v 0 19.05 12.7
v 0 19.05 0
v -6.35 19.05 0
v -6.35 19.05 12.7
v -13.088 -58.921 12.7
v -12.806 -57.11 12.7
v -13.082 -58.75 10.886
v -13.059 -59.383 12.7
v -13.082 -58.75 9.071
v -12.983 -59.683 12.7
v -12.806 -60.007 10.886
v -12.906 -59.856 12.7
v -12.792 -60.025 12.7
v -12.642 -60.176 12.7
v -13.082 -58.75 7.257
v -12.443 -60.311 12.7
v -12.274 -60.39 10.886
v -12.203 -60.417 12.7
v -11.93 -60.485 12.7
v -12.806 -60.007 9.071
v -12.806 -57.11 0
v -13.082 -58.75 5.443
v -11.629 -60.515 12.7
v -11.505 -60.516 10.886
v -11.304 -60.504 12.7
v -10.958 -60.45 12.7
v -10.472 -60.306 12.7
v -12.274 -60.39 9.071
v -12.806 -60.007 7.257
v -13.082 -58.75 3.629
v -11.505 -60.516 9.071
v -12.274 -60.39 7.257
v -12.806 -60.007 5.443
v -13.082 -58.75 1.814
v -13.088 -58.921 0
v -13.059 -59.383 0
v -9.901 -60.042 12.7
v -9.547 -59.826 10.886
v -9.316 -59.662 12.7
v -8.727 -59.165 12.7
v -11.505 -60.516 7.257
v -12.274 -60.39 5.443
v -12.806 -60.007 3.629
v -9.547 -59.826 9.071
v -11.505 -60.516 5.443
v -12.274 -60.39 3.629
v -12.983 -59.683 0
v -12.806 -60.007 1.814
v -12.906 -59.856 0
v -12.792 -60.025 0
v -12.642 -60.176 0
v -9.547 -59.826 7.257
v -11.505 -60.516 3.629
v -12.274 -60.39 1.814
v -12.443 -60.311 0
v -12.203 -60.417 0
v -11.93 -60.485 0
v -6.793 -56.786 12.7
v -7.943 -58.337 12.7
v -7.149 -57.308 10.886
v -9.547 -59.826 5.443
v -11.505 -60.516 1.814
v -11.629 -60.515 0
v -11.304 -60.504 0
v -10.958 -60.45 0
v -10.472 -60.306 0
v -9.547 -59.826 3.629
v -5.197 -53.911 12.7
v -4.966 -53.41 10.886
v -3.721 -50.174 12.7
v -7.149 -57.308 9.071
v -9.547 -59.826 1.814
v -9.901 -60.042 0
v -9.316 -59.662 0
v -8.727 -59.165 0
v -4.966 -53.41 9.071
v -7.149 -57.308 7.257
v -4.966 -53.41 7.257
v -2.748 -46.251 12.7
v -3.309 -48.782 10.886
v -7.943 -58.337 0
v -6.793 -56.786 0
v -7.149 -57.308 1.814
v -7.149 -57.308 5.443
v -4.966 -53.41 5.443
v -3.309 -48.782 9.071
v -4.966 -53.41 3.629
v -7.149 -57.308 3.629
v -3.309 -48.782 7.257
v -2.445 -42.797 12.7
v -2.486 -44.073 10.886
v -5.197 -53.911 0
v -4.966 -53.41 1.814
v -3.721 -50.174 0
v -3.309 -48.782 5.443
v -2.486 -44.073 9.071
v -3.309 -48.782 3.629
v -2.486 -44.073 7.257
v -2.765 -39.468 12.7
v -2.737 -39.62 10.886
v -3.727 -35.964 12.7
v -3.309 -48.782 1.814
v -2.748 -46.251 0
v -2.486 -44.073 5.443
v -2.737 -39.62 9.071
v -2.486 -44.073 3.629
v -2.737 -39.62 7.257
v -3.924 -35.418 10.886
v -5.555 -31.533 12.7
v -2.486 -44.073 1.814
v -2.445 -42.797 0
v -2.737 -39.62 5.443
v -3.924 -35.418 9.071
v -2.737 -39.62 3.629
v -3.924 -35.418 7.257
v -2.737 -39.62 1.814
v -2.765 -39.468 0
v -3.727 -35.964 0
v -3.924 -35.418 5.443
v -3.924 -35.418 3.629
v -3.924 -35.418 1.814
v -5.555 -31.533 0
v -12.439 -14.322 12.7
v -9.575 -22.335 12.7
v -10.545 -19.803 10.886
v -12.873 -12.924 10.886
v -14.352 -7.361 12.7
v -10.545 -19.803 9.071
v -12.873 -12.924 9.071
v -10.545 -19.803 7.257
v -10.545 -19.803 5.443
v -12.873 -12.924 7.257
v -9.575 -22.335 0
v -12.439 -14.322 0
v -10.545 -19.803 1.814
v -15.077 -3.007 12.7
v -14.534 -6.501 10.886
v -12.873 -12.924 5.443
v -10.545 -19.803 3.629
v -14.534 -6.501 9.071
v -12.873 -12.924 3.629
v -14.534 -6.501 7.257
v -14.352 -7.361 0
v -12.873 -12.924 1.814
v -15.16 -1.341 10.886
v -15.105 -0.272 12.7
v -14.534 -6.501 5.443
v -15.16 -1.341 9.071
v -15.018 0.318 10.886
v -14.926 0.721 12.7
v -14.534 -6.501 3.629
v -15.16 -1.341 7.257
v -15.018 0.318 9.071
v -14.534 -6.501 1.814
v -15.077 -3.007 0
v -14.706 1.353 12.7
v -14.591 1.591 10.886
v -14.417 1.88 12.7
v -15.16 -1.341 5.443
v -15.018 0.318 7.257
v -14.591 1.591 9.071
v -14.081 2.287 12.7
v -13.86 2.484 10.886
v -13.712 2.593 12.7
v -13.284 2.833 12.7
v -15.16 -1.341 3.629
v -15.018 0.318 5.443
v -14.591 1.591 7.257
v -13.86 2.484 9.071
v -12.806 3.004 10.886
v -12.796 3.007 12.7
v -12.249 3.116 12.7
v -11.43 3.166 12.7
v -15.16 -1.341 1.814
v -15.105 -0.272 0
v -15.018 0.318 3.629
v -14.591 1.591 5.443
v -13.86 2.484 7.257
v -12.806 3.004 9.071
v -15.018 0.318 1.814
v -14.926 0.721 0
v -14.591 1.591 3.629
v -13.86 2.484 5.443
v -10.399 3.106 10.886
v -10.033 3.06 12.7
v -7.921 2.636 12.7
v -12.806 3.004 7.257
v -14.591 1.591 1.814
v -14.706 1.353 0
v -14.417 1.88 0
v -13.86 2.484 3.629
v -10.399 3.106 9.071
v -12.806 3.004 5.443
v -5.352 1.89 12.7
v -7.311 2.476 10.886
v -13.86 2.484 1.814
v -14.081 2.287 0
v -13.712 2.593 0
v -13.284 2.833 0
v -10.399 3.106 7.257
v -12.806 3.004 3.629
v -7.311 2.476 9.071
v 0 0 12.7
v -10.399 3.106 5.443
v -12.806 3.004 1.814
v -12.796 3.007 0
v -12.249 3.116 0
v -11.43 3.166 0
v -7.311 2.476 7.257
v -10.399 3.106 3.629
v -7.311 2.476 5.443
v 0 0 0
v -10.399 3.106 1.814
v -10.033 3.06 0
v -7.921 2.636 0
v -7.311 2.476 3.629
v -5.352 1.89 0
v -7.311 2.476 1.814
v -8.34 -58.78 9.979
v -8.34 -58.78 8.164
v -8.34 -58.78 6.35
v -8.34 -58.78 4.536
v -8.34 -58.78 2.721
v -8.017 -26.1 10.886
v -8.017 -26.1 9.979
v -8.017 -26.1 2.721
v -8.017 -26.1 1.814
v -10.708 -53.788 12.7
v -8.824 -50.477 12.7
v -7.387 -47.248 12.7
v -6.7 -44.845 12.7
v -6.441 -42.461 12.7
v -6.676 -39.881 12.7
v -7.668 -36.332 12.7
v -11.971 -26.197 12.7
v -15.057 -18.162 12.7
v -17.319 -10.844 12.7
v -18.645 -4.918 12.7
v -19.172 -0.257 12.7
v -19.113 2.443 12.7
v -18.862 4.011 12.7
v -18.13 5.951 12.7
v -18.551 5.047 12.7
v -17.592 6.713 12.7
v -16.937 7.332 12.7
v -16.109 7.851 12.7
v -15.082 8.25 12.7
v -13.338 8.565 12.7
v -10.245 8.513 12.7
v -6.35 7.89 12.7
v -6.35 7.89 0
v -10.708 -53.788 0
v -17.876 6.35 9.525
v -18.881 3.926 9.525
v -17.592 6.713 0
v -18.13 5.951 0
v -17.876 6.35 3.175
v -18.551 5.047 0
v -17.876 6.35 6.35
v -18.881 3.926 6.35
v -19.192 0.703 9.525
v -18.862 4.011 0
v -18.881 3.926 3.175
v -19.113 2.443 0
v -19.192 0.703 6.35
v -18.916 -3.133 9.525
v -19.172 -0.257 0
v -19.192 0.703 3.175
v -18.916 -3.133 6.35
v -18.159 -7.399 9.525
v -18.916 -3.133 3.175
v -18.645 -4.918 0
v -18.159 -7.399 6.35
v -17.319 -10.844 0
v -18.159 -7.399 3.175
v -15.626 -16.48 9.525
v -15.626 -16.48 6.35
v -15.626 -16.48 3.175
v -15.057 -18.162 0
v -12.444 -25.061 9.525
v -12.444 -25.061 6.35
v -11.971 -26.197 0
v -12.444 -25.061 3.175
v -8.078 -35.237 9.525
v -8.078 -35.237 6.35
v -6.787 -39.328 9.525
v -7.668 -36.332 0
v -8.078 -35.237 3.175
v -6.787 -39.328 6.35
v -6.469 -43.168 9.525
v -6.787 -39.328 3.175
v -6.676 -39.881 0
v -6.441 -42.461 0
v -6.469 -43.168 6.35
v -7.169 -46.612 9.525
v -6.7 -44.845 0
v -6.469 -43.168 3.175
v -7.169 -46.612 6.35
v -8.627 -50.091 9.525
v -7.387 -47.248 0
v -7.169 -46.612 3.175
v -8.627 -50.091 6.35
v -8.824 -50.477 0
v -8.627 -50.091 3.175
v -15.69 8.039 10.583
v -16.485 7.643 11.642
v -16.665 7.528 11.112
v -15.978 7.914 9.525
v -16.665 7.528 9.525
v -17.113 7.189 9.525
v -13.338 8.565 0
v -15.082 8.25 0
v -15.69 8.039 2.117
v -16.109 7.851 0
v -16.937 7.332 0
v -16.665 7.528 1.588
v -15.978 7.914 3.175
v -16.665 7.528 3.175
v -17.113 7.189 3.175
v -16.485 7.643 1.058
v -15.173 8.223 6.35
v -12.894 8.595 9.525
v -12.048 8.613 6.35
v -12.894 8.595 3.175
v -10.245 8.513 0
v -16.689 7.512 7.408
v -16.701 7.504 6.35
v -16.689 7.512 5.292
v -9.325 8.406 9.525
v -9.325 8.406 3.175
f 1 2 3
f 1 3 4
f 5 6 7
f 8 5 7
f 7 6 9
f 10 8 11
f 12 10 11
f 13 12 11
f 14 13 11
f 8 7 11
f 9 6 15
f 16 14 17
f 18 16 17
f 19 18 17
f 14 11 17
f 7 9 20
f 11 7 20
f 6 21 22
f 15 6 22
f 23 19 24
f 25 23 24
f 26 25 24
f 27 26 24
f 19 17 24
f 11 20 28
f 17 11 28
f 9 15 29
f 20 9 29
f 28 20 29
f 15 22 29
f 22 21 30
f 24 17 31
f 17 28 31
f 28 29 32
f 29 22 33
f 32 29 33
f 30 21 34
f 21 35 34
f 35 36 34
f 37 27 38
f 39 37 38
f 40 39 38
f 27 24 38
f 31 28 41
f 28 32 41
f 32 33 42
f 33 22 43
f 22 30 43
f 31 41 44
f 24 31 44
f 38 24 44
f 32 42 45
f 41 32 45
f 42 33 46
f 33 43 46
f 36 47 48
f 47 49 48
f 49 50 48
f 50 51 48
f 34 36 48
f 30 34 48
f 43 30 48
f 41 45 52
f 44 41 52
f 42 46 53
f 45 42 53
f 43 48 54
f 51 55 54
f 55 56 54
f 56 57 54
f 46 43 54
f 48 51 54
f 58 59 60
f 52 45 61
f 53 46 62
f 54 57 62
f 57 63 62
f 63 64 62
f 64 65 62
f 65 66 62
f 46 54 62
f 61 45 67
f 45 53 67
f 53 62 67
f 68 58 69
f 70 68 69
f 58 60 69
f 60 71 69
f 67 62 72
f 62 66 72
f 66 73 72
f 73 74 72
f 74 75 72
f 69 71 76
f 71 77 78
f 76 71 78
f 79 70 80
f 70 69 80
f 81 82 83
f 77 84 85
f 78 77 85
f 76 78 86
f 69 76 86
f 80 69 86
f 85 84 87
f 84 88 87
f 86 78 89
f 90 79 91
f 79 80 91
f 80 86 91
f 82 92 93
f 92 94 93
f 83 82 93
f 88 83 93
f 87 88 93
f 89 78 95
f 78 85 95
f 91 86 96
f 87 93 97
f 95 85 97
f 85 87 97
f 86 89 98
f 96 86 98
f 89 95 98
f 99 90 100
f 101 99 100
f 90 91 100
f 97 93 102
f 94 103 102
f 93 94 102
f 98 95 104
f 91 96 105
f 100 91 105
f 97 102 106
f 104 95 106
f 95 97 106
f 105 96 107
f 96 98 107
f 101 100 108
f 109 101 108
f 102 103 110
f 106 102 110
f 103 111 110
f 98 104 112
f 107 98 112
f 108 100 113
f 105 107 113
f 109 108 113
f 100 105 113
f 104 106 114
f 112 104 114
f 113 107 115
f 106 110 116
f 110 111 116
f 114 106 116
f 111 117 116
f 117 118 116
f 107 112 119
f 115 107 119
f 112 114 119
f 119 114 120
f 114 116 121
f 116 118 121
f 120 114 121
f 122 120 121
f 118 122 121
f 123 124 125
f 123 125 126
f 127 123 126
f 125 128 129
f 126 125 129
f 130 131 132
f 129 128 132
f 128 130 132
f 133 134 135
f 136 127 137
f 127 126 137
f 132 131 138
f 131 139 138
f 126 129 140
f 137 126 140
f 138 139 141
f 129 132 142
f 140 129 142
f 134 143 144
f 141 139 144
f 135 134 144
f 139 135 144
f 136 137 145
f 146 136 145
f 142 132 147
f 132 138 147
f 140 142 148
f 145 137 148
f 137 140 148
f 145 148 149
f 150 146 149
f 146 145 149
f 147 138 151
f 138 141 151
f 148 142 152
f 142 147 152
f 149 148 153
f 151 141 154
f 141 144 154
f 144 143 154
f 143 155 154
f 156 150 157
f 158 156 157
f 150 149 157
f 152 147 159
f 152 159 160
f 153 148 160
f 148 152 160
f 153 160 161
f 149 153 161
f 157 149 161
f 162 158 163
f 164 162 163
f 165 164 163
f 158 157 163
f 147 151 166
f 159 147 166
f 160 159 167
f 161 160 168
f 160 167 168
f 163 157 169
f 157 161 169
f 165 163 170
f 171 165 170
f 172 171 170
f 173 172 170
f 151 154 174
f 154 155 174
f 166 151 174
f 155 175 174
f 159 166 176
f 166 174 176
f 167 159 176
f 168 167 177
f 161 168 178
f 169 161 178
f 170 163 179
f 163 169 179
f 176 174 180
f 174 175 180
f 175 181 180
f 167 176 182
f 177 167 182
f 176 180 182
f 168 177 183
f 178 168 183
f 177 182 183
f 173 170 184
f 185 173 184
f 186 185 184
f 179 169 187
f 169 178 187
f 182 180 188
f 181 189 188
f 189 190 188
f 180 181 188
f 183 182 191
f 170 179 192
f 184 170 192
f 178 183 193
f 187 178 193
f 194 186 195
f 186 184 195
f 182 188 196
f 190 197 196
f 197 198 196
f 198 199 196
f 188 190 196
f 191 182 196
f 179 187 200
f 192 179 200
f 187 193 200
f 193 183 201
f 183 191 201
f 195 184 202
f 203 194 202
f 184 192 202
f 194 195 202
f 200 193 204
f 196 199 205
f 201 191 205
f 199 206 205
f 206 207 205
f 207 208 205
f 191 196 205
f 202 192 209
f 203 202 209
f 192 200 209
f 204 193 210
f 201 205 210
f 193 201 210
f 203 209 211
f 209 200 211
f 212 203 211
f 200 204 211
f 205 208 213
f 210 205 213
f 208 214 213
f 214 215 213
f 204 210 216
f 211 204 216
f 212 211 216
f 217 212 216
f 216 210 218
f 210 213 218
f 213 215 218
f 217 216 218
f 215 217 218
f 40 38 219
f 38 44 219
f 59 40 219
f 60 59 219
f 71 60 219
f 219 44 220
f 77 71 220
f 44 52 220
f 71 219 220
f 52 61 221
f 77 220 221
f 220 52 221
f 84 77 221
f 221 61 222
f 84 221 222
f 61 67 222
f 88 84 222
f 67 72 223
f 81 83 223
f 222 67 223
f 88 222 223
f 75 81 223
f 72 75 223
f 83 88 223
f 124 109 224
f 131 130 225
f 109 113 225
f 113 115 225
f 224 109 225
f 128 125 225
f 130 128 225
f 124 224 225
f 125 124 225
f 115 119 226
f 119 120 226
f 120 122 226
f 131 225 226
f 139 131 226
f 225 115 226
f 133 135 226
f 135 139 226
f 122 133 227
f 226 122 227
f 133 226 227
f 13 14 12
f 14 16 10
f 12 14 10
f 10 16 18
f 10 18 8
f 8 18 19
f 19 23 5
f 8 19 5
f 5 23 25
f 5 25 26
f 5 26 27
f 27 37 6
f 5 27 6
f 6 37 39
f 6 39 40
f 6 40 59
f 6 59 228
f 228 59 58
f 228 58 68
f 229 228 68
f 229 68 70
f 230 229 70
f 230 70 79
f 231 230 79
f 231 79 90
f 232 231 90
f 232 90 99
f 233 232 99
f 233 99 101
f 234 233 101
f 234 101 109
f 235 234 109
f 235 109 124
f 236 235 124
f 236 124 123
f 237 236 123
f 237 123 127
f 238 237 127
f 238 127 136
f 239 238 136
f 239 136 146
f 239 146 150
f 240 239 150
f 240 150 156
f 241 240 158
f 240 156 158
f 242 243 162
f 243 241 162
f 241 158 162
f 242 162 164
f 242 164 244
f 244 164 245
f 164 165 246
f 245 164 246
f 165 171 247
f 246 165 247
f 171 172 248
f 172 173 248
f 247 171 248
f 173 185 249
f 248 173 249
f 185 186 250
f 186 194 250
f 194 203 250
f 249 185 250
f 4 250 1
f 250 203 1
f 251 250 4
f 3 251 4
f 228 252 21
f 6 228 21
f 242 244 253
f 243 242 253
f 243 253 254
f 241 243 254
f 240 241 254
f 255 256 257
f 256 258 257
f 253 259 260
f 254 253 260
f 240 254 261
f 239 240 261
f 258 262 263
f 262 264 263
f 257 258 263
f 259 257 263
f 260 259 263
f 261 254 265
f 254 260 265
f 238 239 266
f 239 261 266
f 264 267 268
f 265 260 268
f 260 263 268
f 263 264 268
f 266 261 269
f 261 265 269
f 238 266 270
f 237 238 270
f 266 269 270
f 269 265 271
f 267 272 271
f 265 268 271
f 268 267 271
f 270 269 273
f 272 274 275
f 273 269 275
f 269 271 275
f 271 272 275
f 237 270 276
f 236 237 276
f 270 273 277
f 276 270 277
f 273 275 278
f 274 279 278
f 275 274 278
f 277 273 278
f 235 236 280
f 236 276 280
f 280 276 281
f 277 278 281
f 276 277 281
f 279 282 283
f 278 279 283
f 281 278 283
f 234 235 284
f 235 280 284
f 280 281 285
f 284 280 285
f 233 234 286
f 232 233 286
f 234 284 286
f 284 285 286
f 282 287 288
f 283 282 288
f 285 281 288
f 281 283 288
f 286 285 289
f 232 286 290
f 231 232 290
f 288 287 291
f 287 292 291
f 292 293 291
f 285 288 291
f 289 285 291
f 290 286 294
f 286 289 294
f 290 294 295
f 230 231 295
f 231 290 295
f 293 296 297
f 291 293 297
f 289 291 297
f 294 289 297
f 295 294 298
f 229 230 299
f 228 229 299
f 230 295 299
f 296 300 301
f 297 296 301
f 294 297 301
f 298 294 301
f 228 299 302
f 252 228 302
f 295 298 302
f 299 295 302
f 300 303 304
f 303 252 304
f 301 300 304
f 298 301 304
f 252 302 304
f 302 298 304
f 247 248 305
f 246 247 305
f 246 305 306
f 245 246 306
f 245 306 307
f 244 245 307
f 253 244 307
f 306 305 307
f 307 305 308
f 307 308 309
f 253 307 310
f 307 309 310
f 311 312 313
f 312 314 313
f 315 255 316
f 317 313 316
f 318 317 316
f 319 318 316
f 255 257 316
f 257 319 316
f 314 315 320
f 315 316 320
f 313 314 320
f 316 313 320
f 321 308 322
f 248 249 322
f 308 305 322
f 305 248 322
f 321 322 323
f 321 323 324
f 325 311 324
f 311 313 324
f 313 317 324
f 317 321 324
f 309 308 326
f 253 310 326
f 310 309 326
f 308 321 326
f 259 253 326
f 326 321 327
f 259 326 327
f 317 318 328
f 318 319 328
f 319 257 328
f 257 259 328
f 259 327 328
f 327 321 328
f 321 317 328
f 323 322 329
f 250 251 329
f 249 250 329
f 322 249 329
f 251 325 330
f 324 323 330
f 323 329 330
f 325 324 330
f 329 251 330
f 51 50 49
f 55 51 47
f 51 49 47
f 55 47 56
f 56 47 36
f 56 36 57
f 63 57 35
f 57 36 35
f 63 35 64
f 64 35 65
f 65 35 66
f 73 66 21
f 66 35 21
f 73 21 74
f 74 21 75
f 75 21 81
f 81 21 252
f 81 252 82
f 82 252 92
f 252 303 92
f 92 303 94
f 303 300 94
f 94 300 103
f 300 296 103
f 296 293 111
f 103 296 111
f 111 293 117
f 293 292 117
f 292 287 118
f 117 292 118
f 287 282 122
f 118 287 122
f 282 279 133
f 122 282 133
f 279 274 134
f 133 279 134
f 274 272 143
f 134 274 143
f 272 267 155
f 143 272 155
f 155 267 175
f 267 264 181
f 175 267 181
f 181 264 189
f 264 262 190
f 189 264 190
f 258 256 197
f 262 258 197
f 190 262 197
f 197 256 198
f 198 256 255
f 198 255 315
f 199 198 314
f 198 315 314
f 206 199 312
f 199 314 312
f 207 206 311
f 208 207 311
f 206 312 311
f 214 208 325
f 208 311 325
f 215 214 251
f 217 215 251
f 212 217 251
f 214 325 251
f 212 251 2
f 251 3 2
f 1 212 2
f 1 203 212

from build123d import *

# Parameters (mm, degrees)
F1_DEPTH = 12.7
F2_W     = 12.7
F2_H     = 12.7
F3_DEPTH = 6.35


with BuildPart() as f1:
    # F0 (on Top) → F1 (new body)
    with BuildSketch(Plane.XY):
        with BuildLine():
            add(Edge.make_bspline(
                [(-12.806464918, -57.1100749075), (-13.0511171053, -58.2458277794), (-13.5554621753, -60.5871571905), (-7.8445014496, -60.9654420686), (0.6916654544, -42.2768781505), (-8.3148797468, -27.6876864149), (-16.8004178311, -2.1338792048), (-13.2621993622, 4.8792293647), (-5.0755576482, 1.8673230015), (0, 0)],
                knots=[0, 0, 0, 0, 0.0742550885, 0.1530752217, 0.3343374095, 0.5222712322, 0.7447890218, 0.8417741881, 1, 1, 1, 1], degree=3))
            Line((0, 0), (0, 6.35))
            add(Edge.make_bspline(
                [(0, 6.35), (-7.5534499519, 8.3103537608), (-25.1935665486, 12.8885093231), (-13.0042988029, -26.7683728201), (-3.4251245492, -42.4972898208), (-9.7955705443, -52.4201744592), (-12.806464918, -57.1100749075)],
                knots=[0, 0, 0, 0, 0.2328977508, 0.5439029192, 0.7844326542, 1, 1, 1, 1], degree=3))
        make_face()
    extrude(amount=F1_DEPTH)

    # F2 (on face) → F3 (join)
    with BuildSketch(Plane.YZ):
        with Locations((12.7, 6.35)):
            Rectangle(F2_W, F2_H)
    extrude(amount=-F3_DEPTH)


solid = f1.part
